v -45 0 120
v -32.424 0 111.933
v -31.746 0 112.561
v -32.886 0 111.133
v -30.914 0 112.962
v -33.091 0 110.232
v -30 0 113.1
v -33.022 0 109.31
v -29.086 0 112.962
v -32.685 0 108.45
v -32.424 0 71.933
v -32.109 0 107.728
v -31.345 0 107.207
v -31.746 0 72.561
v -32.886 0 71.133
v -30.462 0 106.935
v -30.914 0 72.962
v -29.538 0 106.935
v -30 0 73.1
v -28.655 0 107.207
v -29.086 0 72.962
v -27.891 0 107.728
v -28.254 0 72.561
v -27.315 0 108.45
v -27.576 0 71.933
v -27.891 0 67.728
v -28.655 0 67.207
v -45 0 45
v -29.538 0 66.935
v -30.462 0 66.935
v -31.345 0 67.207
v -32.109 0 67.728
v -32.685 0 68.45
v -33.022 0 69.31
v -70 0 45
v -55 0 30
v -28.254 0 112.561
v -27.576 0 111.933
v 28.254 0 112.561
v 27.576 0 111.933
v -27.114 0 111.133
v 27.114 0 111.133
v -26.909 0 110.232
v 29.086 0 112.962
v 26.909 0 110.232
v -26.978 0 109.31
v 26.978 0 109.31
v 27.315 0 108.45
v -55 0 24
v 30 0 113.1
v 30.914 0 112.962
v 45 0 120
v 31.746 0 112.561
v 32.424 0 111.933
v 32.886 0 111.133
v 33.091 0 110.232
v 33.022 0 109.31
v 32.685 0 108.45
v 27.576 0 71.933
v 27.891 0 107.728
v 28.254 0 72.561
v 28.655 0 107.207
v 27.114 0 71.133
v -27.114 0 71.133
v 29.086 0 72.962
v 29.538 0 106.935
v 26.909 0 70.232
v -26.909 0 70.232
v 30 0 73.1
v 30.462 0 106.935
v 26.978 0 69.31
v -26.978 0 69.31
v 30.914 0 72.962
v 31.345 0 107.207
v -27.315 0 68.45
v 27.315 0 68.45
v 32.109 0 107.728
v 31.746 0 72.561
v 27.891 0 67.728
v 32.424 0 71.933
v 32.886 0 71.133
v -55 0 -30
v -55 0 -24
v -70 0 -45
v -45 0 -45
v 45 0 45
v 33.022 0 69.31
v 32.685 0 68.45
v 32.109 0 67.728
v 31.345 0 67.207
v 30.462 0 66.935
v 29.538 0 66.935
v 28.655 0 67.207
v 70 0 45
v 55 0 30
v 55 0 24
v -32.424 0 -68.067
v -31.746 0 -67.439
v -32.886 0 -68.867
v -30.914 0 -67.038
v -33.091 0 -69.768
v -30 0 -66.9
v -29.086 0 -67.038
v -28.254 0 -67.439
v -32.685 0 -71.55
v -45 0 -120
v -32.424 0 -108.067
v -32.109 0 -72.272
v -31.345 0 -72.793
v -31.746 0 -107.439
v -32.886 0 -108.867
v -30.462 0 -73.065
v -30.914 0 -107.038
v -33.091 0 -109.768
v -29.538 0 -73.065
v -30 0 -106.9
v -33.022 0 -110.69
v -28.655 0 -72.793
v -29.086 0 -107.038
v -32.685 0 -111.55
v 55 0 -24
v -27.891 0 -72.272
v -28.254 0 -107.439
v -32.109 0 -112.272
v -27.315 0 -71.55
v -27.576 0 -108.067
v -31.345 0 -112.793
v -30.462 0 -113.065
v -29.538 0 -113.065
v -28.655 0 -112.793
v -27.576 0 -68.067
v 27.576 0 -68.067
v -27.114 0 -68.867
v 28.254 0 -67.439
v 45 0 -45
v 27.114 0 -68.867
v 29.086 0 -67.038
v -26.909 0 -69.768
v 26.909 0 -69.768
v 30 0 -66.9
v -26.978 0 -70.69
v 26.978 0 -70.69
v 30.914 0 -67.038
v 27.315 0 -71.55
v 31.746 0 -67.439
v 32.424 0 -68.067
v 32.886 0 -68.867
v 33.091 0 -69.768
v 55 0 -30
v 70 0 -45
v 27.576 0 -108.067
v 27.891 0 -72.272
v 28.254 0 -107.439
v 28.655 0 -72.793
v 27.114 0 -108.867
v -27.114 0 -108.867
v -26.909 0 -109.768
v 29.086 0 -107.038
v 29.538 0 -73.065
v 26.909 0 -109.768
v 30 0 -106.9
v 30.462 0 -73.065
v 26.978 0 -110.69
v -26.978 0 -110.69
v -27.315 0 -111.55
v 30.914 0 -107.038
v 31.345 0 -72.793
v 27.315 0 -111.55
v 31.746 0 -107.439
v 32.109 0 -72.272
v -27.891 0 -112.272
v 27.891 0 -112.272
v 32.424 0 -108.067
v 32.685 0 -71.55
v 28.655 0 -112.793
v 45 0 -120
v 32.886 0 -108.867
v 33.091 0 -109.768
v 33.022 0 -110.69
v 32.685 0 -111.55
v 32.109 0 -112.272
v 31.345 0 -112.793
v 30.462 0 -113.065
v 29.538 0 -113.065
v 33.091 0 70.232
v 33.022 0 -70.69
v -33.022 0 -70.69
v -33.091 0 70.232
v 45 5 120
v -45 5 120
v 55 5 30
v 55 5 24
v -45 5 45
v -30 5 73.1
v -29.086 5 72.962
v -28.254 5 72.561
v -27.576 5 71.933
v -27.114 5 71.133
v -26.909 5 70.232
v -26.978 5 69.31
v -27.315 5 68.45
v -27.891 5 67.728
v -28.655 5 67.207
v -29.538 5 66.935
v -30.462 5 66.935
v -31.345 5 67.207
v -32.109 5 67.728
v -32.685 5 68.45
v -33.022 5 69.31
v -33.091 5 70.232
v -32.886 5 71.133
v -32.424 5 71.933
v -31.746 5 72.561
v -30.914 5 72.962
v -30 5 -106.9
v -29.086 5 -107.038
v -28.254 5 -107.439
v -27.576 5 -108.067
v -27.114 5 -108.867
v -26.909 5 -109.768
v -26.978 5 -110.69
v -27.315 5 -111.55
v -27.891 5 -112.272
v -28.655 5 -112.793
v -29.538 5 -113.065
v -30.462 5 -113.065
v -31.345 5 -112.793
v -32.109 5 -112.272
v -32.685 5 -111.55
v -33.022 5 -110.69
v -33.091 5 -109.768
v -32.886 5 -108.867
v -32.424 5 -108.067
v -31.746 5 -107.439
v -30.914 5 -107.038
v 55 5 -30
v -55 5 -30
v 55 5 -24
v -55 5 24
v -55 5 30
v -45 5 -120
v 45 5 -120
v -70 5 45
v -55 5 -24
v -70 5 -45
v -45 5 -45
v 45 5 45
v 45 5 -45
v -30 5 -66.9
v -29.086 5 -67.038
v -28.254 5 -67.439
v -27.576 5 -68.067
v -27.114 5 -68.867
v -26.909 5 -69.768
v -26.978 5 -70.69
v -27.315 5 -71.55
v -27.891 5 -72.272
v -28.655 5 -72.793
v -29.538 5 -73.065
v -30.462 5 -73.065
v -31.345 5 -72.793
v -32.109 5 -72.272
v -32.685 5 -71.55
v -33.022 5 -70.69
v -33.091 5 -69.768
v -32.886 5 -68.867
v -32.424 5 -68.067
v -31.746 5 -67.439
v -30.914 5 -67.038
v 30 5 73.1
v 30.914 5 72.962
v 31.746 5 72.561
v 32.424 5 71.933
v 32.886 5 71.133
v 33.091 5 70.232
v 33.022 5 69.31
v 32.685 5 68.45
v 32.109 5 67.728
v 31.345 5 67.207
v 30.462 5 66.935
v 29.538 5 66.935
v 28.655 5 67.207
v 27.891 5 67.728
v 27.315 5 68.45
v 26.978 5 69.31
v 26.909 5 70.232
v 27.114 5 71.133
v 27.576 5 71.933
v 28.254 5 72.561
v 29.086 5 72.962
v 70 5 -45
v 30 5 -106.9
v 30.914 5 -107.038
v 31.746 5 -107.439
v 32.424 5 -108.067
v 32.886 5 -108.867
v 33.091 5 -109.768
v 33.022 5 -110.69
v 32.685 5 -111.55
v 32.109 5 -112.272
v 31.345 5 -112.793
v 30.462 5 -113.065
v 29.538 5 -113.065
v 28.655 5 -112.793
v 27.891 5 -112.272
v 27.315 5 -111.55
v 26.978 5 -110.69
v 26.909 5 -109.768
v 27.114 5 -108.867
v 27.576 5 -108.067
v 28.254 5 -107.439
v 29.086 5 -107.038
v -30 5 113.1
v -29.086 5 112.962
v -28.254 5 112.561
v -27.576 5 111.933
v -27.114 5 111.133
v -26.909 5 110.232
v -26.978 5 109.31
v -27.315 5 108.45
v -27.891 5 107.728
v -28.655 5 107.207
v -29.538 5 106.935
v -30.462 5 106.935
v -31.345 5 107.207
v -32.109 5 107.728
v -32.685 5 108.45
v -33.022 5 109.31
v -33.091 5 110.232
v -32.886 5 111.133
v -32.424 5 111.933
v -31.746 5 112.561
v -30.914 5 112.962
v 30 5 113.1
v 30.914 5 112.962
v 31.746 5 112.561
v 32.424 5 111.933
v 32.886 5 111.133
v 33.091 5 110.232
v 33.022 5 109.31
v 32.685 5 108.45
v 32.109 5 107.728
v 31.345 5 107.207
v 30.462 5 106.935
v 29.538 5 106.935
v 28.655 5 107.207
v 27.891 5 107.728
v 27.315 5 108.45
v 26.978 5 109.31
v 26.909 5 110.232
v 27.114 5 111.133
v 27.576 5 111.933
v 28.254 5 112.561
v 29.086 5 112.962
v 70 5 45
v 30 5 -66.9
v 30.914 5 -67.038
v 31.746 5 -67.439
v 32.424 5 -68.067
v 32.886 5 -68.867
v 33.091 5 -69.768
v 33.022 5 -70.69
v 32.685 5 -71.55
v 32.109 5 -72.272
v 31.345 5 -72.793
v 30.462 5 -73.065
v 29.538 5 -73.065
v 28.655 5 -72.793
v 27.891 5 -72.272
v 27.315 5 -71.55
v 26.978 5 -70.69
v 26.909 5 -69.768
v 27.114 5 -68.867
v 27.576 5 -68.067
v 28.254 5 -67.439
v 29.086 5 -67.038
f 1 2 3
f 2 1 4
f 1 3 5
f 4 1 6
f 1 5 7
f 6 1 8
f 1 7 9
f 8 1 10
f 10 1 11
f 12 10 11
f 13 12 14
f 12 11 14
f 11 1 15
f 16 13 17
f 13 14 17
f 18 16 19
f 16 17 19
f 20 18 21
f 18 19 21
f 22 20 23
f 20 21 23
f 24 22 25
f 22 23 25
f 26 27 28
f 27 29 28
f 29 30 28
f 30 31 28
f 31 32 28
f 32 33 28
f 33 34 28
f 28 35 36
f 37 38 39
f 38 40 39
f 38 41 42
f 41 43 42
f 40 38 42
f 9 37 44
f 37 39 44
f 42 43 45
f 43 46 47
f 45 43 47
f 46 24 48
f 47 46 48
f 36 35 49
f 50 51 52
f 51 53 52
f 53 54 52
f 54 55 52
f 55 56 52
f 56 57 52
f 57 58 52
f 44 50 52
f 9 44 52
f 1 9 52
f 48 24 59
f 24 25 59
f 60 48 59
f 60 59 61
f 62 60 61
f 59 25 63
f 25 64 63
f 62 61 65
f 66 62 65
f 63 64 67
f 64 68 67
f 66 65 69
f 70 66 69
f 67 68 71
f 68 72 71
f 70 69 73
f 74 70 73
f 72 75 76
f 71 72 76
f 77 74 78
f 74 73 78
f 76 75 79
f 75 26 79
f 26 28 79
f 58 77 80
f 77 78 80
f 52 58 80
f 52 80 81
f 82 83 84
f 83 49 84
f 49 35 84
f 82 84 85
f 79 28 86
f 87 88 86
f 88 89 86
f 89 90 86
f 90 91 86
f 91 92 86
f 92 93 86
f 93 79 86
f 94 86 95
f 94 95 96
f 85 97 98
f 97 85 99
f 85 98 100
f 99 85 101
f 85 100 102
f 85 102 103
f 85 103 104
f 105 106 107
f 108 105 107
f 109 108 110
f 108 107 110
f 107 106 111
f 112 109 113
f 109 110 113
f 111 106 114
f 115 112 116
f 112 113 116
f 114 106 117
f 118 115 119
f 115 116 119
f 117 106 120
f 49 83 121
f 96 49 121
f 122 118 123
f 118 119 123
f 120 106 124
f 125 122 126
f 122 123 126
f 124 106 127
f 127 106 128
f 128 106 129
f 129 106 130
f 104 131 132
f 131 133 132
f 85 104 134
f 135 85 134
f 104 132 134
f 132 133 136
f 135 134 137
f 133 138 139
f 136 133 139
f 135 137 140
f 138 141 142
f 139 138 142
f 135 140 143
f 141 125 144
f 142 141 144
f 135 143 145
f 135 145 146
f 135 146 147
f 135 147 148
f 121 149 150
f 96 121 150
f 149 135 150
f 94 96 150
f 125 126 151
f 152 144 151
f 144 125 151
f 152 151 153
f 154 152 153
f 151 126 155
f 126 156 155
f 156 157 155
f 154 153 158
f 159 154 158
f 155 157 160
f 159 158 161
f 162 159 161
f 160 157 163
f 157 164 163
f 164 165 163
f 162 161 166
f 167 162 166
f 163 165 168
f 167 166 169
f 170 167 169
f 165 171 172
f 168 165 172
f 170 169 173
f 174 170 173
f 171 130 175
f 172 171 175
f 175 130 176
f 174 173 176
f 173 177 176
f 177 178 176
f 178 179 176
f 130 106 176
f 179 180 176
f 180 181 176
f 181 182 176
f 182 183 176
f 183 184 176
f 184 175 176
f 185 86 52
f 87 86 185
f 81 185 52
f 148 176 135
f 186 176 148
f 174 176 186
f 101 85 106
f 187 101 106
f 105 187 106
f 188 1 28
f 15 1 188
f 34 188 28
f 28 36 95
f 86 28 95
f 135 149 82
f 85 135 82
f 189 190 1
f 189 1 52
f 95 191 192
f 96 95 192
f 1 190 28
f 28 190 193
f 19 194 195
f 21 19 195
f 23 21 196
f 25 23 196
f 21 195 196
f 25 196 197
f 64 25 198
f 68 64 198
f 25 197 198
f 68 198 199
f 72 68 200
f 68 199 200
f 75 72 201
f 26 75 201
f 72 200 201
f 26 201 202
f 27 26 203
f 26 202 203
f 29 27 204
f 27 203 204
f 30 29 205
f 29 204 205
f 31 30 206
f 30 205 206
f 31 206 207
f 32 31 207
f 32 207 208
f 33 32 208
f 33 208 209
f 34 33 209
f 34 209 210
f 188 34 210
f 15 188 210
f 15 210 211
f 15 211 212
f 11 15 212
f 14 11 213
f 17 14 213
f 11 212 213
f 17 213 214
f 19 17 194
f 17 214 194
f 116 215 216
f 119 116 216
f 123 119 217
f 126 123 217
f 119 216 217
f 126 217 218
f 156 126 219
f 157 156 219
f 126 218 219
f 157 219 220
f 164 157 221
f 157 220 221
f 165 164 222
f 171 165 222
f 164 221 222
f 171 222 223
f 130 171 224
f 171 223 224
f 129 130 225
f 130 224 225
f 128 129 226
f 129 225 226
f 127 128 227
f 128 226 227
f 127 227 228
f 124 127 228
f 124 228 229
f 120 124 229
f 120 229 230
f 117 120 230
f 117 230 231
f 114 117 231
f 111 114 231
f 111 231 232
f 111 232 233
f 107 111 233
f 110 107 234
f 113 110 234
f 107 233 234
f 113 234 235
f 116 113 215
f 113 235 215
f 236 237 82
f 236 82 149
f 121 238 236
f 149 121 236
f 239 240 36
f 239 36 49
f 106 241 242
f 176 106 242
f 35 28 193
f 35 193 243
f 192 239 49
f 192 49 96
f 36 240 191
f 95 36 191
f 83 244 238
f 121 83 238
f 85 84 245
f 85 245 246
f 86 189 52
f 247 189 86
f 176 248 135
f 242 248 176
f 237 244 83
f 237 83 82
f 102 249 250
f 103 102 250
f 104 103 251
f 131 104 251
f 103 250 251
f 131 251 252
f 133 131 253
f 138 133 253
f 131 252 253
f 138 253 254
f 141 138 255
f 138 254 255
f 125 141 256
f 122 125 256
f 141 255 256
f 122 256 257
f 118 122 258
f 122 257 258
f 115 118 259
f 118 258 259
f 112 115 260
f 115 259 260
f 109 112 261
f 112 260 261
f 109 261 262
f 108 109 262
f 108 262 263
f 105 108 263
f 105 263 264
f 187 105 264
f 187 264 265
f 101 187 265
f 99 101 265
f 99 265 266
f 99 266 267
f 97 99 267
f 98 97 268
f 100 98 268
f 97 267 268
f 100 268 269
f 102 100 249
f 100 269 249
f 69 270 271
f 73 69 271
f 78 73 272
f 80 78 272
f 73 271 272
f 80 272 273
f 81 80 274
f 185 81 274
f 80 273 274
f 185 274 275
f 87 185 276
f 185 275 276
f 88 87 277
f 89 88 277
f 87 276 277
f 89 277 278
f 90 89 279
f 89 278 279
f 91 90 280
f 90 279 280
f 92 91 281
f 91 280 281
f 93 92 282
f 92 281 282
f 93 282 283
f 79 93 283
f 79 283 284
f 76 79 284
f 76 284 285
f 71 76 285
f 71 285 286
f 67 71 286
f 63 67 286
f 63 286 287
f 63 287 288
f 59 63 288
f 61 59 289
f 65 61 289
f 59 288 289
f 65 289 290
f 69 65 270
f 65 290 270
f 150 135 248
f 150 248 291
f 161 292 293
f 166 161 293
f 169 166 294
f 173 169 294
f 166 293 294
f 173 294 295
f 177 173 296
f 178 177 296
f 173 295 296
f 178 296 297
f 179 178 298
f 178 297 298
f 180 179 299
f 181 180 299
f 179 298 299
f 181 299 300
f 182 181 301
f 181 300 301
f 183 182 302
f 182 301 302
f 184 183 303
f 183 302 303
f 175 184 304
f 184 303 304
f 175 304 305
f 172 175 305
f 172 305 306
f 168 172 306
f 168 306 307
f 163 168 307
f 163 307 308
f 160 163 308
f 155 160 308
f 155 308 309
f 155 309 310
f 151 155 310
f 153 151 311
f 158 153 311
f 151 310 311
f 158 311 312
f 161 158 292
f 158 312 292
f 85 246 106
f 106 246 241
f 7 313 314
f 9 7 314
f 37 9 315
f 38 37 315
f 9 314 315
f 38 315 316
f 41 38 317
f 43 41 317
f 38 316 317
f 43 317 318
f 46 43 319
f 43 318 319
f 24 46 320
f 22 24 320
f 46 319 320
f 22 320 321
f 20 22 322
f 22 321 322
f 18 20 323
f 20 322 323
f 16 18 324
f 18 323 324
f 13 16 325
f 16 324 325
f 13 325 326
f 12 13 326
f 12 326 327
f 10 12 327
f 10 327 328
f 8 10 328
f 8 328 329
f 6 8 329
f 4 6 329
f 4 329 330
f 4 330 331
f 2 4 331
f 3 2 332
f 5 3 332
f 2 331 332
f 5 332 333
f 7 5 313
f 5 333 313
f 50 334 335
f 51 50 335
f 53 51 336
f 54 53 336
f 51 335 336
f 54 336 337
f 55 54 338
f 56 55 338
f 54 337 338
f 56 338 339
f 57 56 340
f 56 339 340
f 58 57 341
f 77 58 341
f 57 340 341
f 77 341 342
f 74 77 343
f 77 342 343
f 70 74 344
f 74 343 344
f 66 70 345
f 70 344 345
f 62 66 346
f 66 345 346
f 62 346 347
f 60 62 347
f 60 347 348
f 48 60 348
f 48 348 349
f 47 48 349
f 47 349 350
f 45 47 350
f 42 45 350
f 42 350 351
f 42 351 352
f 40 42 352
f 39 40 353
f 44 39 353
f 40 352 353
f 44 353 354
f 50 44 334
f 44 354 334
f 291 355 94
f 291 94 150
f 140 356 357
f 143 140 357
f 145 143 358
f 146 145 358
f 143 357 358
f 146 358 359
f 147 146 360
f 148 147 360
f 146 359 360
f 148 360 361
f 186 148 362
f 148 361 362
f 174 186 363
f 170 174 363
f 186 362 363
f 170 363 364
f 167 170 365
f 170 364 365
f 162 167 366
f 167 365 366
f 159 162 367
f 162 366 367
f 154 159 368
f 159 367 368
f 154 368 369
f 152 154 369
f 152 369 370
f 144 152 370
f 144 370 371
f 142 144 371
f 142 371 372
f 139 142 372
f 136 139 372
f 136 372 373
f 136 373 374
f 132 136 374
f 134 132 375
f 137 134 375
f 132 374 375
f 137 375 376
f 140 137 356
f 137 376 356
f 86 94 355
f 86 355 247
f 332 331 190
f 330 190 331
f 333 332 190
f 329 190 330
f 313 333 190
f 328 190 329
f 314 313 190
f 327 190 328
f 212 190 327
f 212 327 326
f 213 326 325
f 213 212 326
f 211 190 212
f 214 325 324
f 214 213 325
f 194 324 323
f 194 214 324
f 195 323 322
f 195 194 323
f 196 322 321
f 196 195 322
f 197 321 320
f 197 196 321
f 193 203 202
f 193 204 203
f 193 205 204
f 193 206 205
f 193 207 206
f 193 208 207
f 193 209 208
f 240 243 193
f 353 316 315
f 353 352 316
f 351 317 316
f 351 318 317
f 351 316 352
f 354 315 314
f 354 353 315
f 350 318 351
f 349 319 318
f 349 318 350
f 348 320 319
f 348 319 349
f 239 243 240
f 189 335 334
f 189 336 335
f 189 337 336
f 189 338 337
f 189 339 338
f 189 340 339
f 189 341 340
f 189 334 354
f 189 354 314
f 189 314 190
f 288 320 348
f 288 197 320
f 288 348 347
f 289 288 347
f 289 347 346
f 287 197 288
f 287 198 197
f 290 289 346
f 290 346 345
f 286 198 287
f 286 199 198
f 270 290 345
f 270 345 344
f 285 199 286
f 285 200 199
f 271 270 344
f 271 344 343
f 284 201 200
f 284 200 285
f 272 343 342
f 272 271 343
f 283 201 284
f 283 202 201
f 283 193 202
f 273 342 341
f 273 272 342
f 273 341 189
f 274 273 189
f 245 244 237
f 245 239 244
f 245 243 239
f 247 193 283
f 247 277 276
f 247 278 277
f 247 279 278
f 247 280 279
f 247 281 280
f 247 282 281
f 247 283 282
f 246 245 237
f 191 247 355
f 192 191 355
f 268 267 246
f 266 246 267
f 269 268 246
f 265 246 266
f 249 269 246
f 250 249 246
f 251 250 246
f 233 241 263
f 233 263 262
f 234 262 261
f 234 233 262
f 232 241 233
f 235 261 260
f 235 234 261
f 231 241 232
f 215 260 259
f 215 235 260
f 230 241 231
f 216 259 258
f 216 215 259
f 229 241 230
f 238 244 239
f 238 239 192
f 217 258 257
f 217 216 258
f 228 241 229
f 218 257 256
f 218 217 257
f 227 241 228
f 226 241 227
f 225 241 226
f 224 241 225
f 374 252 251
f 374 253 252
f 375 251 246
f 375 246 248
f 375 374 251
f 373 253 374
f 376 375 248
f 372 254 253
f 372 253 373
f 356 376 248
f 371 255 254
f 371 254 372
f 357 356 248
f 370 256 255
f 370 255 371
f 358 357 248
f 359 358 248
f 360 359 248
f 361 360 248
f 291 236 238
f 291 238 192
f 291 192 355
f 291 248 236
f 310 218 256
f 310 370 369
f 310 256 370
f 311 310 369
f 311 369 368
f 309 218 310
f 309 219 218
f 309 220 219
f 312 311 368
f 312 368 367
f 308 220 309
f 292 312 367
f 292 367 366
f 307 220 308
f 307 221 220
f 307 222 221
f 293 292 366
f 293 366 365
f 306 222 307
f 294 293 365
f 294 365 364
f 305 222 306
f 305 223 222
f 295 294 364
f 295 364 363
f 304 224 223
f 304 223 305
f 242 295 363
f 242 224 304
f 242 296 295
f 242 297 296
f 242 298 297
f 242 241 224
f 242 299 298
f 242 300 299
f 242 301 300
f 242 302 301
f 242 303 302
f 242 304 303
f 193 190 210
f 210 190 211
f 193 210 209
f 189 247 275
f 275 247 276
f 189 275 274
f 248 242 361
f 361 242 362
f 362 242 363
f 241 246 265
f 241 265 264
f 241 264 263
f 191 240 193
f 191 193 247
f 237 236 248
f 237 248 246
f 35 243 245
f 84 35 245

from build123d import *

# Parameters (mm, degrees)
EXTRUDE_1_DEPTH      = 5
SKETCH_3_W           = 30
SKETCH_3_H           = 90
CUT_EXTRUDE_2_DEPTH  = 5
SKETCH_5_W           = 30
SKETCH_5_H           = 90
CUT_EXTRUDE_3_DEPTH  = 5
SKETCH_7_W           = 90
SKETCH_7_H           = 20
EXTRUDE_2_DEPTH      = 5
SKETCH_9_W           = 90
SKETCH_9_H           = 20
EXTRUDE_3_DEPTH      = 5
SKETCH_10_R          = 3.1
CUT_EXTRUDE_4_DEPTH  = 5
SKETCH_11_R          = 3.1
CUT_EXTRUDE_5_DEPTH  = 5
SKETCH_12_R          = 3.1
CUT_EXTRUDE_7_DEPTH  = 5
SKETCH_13_R          = 3.1
CUT_EXTRUDE_8_DEPTH  = 5
SKETCH_14_W          = 100
SKETCH_14_H          = 6
CUT_EXTRUDE_9_DEPTH  = 5
SKETCH_15_W          = 100
SKETCH_15_H          = 6
CUT_EXTRUDE_10_DEPTH = 5
SKETCH_16_W          = 5
SKETCH_16_H          = 6
CUT_EXTRUDE_11_DEPTH = 5
SKETCH_17_W          = 5
SKETCH_17_H          = 6
CUT_EXTRUDE_12_DEPTH = 5
SKETCH_18_W          = 5
SKETCH_18_H          = 6
CUT_EXTRUDE_13_DEPTH = 5
SKETCH_19_W          = 5
SKETCH_19_H          = 6
CUT_EXTRUDE_14_DEPTH = 5


with BuildPart() as part:
    # 草图1 → 凸台-拉伸1 (new body)
    with BuildSketch(Plane(origin=(0, 0, 0), x_dir=(1, 0, 0), z_dir=(0, 1, 0))):
        Polygon((45, 45), (100, 45), (100, -45), (45, -45), (45, -100), (-45, -100), (-45, -45), (-100, -45), (-100, 45), (-45, 45), (-45, 100), (45, 100), align=None)
    extrude(amount=EXTRUDE_1_DEPTH)

    # 草图3 → 切除-拉伸2 (cut)
    with BuildSketch(Plane(origin=(0, 5, 0), x_dir=(1, 0, 0), z_dir=(0, 1, 0))):
        with Locations((-85, 0)):
            Rectangle(SKETCH_3_W, SKETCH_3_H)
    extrude(amount=-CUT_EXTRUDE_2_DEPTH, mode=Mode.SUBTRACT)

    # 草图5 → 切除-拉伸3 (cut)
    with BuildSketch(Plane(origin=(0, 5, 0), x_dir=(1, 0, 0), z_dir=(0, 1, 0))):
        with Locations((85, 0)):
            Rectangle(SKETCH_5_W, SKETCH_5_H)
    extrude(amount=-CUT_EXTRUDE_3_DEPTH, mode=Mode.SUBTRACT)

    # 草图7 → 凸台-拉伸2 (add)
    with BuildSketch(Plane(origin=(0, 5, 0), x_dir=(1, 0, 0), z_dir=(0, 1, 0))):
        with Locations((0, 110)):
            Rectangle(SKETCH_7_W, SKETCH_7_H)
    extrude(amount=-EXTRUDE_2_DEPTH)

    # 草图9 → 凸台-拉伸3 (add)
    with BuildSketch(Plane(origin=(0, 5, 0), x_dir=(1, 0, 0), z_dir=(0, 1, 0))):
        with Locations((0, -110)):
            Rectangle(SKETCH_9_W, SKETCH_9_H)
    extrude(amount=-EXTRUDE_3_DEPTH)

    # 草图10 → 切除-拉伸4 (cut)
    with BuildSketch(Plane(origin=(0, 5, 0), x_dir=(1, 0, 0), z_dir=(0, 1, 0))):
        with Locations(Location((-30, 110, 0), (0, 0, 270))):
            Circle(SKETCH_10_R)
        with Locations(Location((-30, 70, 0), (0, 0, 270))):
            Circle(SKETCH_10_R)
    extrude(amount=-CUT_EXTRUDE_4_DEPTH, mode=Mode.SUBTRACT)

    # 草图11 → 切除-拉伸5 (cut)
    with BuildSketch(Plane(origin=(0, 5, 0), x_dir=(1, 0, 0), z_dir=(0, 1, 0))):
        with Locations(Location((30, 110, 0), (0, 0, 270))):
            Circle(SKETCH_11_R)
        with Locations(Location((30, 70, 0), (0, 0, 270))):
            Circle(SKETCH_11_R)
    extrude(amount=-CUT_EXTRUDE_5_DEPTH, mode=Mode.SUBTRACT)

    # 草图12 → 切除-拉伸7 (cut)
    with BuildSketch(Plane(origin=(0, 5, 0), x_dir=(1, 0, 0), z_dir=(0, 1, 0))):
        with Locations(Location((-30, -110, 0), (0, 0, 270))):
            Circle(SKETCH_12_R)
        with Locations(Location((-30, -70, 0), (0, 0, 270))):
            Circle(SKETCH_12_R)
    extrude(amount=-CUT_EXTRUDE_7_DEPTH, mode=Mode.SUBTRACT)

    # 草图13 → 切除-拉伸8 (cut)
    with BuildSketch(Plane(origin=(0, 5, 0), x_dir=(1, 0, 0), z_dir=(0, 1, 0))):
        with Locations(Location((30, -110, 0), (0, 0, 270))):
            Circle(SKETCH_13_R)
        with Locations(Location((30, -70, 0), (0, 0, 270))):
            Circle(SKETCH_13_R)
    extrude(amount=-CUT_EXTRUDE_8_DEPTH, mode=Mode.SUBTRACT)

    # 草图14 → 切除-拉伸9 (cut)
    with BuildSketch(Plane(origin=(0, 5, 0), x_dir=(1, 0, 0), z_dir=(0, 1, 0))):
        with Locations((0, 27)):
            Rectangle(SKETCH_14_W, SKETCH_14_H)
    extrude(amount=-CUT_EXTRUDE_9_DEPTH, mode=Mode.SUBTRACT)

    # 草图15 → 切除-拉伸10 (cut)
    with BuildSketch(Plane(origin=(0, 5, 0), x_dir=(1, 0, 0), z_dir=(0, 1, 0))):
        with Locations((0, -27)):
            Rectangle(SKETCH_15_W, SKETCH_15_H)
    extrude(amount=-CUT_EXTRUDE_10_DEPTH, mode=Mode.SUBTRACT)

    # 草图16 → 切除-拉伸11 (cut)
    with BuildSketch(Plane(origin=(0, 5, 0), x_dir=(1, 0, 0), z_dir=(0, 1, 0))):
        with Locations((52.5, 27)):
            Rectangle(SKETCH_16_W, SKETCH_16_H)
    extrude(amount=-CUT_EXTRUDE_11_DEPTH, mode=Mode.SUBTRACT)

    # 草图17 → 切除-拉伸12 (cut)
    with BuildSketch(Plane(origin=(0, 5, 0), x_dir=(1, 0, 0), z_dir=(0, 1, 0))):
        with Locations((52.5, -27)):
            Rectangle(SKETCH_17_W, SKETCH_17_H)
    extrude(amount=-CUT_EXTRUDE_12_DEPTH, mode=Mode.SUBTRACT)

    # 草图18 → 切除-拉伸13 (cut)
    with BuildSketch(Plane(origin=(0, 5, 0), x_dir=(1, 0, 0), z_dir=(0, 1, 0))):
        with Locations((-52.5, 27)):
            Rectangle(SKETCH_18_W, SKETCH_18_H)
    extrude(amount=-CUT_EXTRUDE_13_DEPTH, mode=Mode.SUBTRACT)

    # 草图19 → 切除-拉伸14 (cut)
    with BuildSketch(Plane(origin=(0, 5, 0), x_dir=(1, 0, 0), z_dir=(0, 1, 0))):
        with Locations((-52.5, -27)):
            Rectangle(SKETCH_19_W, SKETCH_19_H)
    extrude(amount=-CUT_EXTRUDE_14_DEPTH, mode=Mode.SUBTRACT)


solid = part.part
